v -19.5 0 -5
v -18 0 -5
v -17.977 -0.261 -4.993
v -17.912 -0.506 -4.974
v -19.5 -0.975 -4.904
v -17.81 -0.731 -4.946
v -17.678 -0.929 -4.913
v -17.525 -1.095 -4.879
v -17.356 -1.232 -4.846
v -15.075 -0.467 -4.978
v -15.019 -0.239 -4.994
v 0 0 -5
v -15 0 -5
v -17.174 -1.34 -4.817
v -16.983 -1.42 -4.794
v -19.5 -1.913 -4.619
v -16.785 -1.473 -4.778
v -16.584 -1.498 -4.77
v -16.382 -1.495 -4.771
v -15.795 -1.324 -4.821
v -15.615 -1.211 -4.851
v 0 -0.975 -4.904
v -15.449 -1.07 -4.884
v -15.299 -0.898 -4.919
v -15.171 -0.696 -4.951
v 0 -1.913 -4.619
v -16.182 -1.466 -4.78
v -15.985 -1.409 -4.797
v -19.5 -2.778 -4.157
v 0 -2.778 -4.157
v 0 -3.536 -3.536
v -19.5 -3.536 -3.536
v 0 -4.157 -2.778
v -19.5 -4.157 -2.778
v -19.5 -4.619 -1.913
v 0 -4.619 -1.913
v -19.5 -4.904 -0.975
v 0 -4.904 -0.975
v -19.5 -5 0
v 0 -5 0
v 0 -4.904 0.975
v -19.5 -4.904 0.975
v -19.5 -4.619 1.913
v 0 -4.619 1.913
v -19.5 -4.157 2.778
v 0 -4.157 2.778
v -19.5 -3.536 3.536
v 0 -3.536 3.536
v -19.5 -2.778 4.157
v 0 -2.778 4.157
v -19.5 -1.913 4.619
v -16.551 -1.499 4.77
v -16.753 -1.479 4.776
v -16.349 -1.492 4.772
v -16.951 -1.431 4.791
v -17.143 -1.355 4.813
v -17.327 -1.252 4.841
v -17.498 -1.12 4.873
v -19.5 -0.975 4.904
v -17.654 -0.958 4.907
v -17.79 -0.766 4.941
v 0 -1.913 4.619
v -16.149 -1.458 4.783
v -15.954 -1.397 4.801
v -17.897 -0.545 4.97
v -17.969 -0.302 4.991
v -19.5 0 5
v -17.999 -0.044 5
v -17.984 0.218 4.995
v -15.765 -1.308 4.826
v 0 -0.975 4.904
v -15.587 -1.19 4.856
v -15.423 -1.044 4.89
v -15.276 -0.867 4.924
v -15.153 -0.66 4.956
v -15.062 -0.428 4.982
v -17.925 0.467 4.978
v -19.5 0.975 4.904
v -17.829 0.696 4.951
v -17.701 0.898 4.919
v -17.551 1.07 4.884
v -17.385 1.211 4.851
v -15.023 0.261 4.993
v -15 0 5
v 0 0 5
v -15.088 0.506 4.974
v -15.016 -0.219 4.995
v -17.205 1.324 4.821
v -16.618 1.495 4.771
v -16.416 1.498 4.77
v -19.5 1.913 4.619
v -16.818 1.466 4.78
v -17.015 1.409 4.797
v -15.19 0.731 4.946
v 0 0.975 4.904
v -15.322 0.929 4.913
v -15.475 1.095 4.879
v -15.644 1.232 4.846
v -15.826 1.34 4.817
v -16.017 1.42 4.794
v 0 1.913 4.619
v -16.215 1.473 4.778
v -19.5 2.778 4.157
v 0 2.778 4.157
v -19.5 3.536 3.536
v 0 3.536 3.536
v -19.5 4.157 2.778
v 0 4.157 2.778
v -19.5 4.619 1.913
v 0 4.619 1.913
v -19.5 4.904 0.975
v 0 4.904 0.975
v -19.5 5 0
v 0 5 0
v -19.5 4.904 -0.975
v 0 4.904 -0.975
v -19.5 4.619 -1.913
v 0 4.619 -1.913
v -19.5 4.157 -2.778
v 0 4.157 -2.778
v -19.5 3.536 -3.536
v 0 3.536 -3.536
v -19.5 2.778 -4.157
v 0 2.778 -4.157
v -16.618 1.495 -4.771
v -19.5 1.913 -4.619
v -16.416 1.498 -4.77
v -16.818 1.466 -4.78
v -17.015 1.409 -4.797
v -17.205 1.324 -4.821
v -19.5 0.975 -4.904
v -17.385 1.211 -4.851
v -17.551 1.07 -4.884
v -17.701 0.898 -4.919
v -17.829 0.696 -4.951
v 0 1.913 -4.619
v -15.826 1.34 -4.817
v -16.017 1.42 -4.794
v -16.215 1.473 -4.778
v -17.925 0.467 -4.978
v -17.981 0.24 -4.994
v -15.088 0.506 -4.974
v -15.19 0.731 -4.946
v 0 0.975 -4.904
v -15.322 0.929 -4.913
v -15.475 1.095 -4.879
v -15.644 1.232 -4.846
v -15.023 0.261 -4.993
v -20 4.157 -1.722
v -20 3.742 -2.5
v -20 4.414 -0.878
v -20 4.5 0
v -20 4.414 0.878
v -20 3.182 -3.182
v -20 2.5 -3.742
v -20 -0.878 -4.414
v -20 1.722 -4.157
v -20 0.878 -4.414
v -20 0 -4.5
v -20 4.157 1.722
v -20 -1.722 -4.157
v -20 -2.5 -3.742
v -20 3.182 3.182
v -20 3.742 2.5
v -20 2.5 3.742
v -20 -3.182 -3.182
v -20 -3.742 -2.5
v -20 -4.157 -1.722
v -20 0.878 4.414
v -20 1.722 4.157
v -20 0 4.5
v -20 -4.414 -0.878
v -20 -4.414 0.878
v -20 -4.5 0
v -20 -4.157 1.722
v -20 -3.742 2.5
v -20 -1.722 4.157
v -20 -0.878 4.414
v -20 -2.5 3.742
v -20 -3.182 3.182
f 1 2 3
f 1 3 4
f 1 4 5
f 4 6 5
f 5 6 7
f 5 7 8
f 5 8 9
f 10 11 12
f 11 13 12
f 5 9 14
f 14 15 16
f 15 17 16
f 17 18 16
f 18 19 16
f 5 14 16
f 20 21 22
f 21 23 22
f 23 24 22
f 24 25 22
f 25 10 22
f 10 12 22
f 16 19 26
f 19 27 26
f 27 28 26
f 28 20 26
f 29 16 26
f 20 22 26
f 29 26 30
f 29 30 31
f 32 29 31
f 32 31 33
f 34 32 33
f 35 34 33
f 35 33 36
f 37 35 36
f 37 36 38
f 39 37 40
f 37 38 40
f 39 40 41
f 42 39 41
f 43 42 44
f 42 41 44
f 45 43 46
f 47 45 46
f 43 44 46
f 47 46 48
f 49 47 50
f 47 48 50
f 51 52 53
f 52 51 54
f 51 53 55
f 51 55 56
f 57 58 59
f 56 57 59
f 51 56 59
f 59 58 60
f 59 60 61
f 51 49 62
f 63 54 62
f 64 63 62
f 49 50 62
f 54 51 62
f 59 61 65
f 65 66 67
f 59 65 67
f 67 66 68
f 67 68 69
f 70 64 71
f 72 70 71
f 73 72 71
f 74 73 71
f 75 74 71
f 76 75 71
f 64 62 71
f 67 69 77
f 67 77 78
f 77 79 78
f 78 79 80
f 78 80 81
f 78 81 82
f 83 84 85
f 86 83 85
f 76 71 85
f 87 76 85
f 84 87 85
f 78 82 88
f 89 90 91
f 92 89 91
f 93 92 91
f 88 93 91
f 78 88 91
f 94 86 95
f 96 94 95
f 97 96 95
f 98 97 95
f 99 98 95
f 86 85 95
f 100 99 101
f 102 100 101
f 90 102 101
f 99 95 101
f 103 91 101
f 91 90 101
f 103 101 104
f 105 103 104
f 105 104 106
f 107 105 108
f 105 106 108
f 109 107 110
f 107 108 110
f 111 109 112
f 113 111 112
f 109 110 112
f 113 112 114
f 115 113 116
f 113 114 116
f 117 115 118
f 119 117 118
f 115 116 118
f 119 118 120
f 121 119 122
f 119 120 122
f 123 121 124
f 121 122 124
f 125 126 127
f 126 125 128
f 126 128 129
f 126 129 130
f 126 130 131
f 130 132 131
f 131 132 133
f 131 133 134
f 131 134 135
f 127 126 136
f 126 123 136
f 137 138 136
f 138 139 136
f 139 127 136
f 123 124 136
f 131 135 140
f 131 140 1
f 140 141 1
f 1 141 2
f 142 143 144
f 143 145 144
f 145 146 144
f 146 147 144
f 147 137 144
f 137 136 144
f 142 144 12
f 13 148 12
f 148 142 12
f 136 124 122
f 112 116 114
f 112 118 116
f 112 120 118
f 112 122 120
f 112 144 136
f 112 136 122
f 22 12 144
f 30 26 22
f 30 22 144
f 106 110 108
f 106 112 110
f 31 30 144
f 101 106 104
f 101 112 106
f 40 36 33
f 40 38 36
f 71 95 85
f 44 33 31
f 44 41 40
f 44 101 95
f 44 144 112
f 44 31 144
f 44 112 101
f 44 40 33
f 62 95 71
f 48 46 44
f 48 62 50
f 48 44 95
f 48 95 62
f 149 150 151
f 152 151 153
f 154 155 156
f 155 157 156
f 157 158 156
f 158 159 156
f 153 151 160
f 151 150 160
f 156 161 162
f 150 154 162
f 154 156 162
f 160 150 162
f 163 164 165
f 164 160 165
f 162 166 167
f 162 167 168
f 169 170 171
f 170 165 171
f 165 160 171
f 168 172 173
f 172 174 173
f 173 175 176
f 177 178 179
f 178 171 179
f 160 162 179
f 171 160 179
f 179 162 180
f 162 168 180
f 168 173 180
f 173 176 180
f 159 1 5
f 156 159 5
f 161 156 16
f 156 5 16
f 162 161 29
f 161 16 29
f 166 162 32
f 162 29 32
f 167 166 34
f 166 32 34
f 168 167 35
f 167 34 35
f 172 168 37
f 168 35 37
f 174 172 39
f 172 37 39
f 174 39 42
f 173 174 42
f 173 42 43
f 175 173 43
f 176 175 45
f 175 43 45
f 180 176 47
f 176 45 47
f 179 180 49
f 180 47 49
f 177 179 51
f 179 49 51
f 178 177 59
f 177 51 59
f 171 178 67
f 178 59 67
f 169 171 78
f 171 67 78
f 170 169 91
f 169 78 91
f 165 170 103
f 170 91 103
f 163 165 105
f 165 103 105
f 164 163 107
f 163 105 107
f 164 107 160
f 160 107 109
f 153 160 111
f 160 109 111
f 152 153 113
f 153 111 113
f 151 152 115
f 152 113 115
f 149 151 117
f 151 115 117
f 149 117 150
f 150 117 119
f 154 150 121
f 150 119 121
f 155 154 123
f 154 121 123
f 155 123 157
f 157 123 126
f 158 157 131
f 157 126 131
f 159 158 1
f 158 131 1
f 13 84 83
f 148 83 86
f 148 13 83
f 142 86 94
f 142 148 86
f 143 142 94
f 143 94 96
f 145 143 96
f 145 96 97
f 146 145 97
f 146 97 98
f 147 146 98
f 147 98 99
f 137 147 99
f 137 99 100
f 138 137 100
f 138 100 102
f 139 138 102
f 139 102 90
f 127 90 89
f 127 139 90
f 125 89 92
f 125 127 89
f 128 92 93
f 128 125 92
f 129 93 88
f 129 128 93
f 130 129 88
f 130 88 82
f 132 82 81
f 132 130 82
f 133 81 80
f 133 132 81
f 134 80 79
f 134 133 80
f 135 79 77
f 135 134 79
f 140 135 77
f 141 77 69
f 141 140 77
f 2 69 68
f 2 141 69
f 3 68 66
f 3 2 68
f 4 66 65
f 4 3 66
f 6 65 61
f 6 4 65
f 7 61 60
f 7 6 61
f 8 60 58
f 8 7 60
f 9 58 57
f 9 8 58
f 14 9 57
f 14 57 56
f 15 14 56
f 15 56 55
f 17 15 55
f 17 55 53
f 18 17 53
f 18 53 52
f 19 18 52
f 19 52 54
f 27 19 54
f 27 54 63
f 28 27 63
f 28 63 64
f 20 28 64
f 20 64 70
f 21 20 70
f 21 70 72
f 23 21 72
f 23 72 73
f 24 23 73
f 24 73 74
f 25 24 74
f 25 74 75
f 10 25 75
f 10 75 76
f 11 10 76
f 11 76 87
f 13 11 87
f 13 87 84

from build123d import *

# Parameters (mm, degrees)
ESQUISSE1_W           = 20
ESQUISSE1_H           = 5
CHANFREIN1_SIZE       = 0.5
EXTRUSION1_DEPTH      = 22.213203436
EXTRUSION1_DEPTH_BACK = 22.213203436
ESQUISSE2_R           = 1.5


with BuildPart() as part:
    # Esquisse1 → Base-Révolution (revolve)
    with BuildSketch(Plane.XY, mode=Mode.PRIVATE) as base_r_volution_sk:
        with Locations((-10, 2.5)):
            Rectangle(ESQUISSE1_W, ESQUISSE1_H)
    revolve(base_r_volution_sk.sketch.rotate(Axis((0, 0, 0), (-1, 0, 0)), 90), axis=Axis((0, 0, 0), (-1, 0, 0)))

    # Chanfrein1
    chanfrein1_edges = [part.edges().sort_by_distance(p)[0] for p in [
        (-20, 0, 5),
    ]]
    chamfer(chanfrein1_edges, length=CHANFREIN1_SIZE)

    # Esquisse2 → Extrusion1 (cut, two sides: drawn at the far end of the back side and taken through both)
    with BuildSketch(Plane.XY.offset(-EXTRUSION1_DEPTH_BACK)):
        with Locations((-16.5, 0)):
            Circle(ESQUISSE2_R)
    extrude(amount=EXTRUSION1_DEPTH + EXTRUSION1_DEPTH_BACK, mode=Mode.SUBTRACT)


solid = part.part
